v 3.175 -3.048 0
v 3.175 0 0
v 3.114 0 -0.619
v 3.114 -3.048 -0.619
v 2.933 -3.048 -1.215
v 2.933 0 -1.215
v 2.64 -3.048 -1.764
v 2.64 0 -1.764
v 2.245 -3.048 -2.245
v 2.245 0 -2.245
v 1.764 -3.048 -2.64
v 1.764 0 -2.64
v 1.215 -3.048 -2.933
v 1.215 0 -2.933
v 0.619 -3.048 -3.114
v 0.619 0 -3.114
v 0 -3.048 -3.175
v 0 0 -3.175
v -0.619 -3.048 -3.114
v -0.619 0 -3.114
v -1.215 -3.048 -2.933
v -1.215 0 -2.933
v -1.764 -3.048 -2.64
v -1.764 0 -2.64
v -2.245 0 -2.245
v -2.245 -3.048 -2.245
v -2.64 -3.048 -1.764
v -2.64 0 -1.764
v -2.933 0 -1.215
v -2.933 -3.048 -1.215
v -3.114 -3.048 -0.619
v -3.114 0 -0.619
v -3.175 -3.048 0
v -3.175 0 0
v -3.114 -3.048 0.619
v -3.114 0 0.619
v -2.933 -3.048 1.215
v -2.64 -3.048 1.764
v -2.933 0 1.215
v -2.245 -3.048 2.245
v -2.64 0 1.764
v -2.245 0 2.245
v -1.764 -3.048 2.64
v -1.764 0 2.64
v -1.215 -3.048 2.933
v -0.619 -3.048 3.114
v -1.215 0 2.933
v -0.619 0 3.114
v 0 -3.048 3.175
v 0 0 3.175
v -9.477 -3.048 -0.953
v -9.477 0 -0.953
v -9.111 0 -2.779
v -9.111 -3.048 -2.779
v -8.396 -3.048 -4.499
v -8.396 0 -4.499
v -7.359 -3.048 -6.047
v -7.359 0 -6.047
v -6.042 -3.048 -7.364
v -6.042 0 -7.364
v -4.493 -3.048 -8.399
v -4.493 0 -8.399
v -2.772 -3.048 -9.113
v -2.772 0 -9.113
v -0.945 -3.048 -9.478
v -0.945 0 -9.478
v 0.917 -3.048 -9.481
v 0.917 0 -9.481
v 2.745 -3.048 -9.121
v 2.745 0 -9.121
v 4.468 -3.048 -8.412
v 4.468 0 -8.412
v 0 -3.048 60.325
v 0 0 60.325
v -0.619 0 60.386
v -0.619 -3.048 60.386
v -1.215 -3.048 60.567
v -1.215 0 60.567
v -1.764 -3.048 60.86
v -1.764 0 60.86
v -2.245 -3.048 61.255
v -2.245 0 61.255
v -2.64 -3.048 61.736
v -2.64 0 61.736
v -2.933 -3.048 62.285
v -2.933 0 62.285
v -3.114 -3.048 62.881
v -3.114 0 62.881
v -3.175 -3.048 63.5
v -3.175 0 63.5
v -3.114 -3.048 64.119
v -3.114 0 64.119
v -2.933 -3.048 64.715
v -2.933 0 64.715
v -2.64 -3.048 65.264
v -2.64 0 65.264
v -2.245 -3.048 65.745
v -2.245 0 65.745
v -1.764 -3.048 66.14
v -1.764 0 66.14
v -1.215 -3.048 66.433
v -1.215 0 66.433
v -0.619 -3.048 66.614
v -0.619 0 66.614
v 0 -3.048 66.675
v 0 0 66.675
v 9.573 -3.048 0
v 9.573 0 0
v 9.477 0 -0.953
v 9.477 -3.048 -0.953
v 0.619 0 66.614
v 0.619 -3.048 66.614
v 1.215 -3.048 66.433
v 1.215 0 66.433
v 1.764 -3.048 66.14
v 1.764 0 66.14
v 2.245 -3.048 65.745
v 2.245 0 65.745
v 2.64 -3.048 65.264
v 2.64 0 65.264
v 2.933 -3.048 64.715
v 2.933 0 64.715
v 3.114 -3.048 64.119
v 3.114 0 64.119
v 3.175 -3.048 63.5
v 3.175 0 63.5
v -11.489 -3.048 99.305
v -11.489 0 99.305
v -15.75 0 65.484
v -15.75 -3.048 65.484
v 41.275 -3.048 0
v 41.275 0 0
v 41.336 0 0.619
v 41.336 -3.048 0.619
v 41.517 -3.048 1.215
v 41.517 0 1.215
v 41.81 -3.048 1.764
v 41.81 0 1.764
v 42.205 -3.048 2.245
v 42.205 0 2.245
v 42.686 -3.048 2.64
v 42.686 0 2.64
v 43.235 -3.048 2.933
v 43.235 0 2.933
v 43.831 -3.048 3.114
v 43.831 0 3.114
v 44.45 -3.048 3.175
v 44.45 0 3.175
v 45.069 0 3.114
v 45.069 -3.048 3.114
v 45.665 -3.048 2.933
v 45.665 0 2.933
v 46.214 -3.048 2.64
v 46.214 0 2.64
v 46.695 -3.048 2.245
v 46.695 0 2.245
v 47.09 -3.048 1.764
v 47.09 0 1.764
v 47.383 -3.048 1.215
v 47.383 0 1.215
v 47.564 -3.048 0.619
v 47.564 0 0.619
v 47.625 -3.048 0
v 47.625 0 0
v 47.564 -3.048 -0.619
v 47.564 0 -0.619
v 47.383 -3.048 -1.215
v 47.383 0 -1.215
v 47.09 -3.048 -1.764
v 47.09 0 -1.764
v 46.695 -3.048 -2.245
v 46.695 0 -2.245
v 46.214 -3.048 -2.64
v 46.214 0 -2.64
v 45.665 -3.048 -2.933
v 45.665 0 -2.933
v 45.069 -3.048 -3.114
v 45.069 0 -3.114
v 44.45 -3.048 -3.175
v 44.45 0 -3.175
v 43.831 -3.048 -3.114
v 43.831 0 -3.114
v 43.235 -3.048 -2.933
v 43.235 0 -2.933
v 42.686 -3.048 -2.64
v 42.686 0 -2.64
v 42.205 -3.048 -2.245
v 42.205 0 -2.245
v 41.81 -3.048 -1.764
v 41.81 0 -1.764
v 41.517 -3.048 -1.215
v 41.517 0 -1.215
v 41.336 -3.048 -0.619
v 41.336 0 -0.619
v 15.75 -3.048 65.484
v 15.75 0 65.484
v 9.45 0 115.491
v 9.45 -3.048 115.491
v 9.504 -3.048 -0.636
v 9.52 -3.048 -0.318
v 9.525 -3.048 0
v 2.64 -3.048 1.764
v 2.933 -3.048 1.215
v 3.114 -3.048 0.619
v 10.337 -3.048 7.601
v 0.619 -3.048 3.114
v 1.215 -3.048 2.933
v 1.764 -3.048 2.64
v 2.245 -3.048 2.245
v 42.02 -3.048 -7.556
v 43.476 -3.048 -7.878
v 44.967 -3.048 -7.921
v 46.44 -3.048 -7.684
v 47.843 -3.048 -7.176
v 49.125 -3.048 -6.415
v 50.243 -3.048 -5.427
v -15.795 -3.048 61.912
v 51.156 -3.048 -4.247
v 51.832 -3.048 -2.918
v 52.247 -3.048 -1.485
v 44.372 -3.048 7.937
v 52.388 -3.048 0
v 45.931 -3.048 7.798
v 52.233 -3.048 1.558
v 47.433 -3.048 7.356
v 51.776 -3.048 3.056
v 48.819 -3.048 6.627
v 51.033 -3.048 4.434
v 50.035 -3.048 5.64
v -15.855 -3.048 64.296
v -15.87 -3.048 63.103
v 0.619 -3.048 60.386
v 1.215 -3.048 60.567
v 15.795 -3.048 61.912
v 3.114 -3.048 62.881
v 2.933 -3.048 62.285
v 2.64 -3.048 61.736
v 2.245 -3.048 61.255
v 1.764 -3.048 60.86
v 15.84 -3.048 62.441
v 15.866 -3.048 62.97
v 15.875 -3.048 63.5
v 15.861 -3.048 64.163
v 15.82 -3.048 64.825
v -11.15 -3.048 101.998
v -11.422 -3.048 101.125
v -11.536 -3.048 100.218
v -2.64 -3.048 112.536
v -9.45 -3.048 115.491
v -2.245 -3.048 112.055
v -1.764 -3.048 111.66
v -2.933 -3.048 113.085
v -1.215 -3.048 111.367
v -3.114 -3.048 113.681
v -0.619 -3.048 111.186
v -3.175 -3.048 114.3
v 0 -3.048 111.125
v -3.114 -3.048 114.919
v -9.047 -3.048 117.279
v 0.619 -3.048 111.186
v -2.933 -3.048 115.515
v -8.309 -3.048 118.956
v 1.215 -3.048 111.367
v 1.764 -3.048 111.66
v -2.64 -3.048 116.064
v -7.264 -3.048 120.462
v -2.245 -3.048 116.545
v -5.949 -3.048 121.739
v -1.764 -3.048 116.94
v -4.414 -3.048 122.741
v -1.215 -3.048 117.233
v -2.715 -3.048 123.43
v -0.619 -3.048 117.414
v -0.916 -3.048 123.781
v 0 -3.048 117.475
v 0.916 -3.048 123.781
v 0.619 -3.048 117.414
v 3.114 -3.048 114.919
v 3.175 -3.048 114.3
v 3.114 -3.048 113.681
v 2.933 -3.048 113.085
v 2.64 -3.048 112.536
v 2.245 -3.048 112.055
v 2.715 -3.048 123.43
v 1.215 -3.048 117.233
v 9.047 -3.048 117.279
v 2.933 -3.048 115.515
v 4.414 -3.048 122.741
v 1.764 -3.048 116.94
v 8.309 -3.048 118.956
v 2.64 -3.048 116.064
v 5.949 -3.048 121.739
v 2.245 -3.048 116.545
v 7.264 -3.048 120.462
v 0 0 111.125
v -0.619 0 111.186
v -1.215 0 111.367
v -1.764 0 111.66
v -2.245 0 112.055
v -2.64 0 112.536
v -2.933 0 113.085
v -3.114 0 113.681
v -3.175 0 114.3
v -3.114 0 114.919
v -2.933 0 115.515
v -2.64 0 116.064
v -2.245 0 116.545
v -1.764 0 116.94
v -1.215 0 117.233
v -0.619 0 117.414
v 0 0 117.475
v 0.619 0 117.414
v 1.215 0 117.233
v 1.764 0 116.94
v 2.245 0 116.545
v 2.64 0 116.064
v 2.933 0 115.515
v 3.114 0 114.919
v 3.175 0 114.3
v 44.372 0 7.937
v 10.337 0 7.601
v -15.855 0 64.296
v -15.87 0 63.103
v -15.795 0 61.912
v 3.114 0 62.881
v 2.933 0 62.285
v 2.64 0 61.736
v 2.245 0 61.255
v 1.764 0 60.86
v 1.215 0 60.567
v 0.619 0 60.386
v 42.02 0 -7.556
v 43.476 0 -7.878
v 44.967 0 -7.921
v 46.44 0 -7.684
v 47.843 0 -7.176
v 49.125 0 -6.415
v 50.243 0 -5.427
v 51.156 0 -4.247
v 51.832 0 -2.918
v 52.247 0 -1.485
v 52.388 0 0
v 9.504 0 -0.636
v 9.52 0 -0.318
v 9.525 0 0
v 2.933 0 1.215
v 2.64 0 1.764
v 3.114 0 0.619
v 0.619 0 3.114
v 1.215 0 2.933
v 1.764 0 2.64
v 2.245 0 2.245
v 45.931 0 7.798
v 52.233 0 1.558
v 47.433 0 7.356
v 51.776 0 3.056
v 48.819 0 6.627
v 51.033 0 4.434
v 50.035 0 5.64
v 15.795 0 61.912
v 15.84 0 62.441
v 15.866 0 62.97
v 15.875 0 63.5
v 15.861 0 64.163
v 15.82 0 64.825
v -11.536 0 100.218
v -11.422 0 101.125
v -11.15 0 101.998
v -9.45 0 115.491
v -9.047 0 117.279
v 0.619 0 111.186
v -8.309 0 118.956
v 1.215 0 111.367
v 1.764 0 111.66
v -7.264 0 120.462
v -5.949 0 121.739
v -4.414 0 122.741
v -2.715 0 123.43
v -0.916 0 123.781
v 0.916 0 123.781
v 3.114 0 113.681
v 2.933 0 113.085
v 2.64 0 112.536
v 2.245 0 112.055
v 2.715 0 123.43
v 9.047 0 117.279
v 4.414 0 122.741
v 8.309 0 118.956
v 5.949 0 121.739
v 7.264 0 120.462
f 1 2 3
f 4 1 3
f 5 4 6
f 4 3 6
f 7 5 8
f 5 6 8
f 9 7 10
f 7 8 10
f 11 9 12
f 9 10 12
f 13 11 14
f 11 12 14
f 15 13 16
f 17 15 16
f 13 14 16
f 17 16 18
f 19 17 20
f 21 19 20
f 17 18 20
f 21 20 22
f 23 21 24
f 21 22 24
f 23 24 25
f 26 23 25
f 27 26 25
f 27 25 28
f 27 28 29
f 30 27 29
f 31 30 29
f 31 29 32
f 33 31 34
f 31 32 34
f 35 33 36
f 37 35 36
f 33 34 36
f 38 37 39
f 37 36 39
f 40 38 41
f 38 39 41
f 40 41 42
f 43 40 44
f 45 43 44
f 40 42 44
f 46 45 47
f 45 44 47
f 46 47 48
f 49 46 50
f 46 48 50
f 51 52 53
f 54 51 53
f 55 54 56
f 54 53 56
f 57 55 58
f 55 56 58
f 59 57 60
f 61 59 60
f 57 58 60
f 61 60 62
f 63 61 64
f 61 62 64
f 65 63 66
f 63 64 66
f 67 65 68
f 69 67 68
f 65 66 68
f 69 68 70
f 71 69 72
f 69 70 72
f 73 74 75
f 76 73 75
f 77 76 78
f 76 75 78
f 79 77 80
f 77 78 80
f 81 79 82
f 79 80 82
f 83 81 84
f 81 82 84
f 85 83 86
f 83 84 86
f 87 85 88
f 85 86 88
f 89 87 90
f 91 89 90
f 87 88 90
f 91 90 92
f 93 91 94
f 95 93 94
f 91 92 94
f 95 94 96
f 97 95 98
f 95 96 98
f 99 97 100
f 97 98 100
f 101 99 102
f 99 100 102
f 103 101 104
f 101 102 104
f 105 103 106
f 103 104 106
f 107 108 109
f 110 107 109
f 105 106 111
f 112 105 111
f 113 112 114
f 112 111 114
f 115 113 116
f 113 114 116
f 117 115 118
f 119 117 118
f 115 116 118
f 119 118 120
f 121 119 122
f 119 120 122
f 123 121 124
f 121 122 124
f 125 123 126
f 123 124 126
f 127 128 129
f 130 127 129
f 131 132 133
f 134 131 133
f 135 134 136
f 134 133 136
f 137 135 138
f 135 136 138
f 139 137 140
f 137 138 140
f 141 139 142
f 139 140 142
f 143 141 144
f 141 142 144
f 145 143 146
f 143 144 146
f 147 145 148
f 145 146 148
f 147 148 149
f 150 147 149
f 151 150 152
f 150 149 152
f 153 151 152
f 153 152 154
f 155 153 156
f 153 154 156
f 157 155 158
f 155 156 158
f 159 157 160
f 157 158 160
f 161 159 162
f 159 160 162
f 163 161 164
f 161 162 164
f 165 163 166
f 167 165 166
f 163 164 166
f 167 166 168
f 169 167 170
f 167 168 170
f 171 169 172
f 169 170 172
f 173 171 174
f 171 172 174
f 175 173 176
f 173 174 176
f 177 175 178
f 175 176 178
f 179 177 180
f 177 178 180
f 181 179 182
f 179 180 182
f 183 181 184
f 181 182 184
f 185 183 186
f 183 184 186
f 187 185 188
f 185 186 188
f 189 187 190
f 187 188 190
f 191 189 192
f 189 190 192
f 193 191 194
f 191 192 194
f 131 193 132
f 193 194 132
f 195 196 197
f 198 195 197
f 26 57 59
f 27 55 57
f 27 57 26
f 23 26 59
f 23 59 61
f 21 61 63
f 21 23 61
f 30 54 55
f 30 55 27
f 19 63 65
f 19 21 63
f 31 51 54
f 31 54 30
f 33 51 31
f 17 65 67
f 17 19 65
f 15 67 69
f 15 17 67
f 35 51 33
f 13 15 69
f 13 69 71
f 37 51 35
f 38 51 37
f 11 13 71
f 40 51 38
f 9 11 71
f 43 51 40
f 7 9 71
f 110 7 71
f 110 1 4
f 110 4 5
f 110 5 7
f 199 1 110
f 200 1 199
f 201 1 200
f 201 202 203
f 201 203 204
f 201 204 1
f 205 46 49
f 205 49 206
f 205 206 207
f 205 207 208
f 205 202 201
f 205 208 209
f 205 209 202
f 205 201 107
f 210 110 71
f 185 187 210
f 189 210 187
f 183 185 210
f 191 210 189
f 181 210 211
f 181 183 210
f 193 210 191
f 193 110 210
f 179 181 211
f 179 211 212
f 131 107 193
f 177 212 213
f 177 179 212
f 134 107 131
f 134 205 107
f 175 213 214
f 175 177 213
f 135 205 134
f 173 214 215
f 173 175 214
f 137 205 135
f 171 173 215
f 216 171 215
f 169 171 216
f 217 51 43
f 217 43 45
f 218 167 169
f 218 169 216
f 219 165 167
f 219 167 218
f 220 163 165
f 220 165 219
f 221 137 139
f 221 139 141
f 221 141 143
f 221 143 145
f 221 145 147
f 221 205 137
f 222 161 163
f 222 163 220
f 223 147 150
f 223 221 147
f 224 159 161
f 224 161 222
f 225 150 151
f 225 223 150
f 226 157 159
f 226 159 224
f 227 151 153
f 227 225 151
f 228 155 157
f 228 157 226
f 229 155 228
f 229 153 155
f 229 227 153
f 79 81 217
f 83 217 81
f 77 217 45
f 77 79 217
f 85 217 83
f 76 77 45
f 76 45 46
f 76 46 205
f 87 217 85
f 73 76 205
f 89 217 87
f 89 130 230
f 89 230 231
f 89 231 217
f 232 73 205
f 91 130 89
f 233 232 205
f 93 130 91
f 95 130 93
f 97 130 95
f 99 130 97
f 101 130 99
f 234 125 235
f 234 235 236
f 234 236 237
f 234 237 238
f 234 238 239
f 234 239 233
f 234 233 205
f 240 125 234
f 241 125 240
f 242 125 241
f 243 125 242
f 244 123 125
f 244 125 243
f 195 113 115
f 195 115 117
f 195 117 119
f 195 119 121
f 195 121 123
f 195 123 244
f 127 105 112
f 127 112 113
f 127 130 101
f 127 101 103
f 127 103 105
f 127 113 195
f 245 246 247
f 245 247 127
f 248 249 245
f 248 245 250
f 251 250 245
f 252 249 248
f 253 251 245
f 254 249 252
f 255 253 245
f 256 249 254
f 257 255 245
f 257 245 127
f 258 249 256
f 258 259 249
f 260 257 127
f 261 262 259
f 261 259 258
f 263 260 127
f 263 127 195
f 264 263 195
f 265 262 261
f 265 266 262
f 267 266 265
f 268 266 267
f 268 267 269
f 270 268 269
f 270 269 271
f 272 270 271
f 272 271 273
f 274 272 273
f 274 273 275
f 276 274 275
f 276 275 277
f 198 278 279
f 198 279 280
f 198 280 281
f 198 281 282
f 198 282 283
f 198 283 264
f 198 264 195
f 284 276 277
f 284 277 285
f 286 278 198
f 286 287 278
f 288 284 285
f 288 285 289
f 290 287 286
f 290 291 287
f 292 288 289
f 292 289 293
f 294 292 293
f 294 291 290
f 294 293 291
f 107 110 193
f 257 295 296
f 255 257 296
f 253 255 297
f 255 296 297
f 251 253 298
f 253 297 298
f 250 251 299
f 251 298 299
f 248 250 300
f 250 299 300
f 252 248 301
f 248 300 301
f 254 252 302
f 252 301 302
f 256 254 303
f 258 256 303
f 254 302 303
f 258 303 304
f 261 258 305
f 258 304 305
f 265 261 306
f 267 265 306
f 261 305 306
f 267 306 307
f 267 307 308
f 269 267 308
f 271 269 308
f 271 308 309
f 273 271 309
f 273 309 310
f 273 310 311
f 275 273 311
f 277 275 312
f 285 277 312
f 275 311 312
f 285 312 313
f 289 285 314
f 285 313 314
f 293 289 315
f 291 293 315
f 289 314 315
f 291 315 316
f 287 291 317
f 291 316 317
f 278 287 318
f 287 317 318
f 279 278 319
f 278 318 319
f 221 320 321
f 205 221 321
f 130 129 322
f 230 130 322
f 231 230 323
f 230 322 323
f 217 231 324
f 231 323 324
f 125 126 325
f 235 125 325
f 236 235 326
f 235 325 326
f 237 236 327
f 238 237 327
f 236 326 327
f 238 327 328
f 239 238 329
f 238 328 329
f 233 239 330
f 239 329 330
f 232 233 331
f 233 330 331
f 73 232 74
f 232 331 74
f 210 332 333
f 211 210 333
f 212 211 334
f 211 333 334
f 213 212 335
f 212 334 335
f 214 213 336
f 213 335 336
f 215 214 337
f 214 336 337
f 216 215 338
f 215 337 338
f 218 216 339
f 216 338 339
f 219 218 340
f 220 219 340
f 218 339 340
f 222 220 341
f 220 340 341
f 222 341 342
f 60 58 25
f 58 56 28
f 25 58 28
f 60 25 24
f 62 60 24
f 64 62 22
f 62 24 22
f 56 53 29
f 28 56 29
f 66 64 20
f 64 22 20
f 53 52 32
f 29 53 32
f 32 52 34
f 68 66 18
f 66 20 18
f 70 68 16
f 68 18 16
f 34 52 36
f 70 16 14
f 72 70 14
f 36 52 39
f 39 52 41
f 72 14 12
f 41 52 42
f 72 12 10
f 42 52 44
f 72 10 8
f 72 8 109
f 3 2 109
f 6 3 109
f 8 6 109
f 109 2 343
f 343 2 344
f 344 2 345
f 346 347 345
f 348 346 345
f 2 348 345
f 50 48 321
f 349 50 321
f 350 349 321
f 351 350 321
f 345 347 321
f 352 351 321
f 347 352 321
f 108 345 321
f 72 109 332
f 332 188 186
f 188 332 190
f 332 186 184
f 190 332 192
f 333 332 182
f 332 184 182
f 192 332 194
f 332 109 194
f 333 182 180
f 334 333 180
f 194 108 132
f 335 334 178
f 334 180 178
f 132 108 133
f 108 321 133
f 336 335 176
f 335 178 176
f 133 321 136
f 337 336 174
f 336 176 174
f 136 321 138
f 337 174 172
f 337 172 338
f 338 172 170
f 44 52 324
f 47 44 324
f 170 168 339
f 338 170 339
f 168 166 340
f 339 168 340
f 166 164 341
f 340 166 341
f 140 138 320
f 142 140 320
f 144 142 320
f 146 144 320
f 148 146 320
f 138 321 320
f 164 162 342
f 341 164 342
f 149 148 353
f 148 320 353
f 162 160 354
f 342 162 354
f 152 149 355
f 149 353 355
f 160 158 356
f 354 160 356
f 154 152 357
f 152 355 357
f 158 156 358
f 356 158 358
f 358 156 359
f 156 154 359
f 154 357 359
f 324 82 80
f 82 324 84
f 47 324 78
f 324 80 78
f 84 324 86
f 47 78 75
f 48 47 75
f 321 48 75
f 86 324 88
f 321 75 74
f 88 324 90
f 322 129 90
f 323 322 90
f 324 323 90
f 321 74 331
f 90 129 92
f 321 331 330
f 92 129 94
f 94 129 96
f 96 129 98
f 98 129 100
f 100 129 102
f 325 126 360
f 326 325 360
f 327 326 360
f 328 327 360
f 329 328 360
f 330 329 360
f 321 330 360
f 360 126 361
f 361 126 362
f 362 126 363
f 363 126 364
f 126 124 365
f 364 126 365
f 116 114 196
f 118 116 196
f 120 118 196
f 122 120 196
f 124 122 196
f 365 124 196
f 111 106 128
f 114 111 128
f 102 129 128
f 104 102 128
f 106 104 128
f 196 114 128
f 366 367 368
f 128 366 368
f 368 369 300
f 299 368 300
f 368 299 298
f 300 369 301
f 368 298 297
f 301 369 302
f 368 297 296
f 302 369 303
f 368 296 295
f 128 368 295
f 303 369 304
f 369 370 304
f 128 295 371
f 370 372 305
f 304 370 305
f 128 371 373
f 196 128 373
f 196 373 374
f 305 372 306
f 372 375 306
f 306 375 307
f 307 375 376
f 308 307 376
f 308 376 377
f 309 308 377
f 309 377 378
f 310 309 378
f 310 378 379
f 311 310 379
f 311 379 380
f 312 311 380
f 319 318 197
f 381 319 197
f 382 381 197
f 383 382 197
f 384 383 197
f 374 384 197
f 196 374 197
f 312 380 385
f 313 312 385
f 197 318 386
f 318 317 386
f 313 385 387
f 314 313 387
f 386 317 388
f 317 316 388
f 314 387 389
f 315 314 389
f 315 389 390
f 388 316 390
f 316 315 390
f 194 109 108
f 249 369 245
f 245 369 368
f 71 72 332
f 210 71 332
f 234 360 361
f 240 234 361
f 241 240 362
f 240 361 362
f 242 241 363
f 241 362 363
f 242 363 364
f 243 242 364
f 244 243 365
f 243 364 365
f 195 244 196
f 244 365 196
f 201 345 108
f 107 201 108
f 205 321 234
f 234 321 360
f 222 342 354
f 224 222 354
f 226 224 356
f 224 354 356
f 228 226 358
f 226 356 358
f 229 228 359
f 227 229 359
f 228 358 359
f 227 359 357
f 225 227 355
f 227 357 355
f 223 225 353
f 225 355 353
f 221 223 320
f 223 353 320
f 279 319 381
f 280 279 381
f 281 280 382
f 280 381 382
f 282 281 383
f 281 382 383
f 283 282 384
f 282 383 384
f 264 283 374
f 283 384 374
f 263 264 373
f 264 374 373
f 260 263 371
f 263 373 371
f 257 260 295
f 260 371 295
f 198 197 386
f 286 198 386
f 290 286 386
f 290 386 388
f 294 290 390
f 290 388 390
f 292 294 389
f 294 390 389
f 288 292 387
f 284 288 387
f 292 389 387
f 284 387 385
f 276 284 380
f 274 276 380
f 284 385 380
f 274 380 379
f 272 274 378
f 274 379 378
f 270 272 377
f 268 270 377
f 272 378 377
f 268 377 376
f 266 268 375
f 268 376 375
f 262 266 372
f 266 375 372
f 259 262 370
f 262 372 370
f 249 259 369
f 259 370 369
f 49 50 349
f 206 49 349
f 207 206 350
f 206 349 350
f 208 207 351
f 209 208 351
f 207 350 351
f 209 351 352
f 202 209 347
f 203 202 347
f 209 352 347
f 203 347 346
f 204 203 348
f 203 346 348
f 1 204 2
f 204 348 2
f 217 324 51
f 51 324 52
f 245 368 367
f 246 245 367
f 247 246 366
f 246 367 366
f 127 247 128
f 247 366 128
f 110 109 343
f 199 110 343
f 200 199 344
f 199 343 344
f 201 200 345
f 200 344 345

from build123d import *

# Parameters (mm, degrees)
F1_DEPTH = 3.048


with BuildPart() as f1:
    # F0 (on Front) → F1 (new body)
    with BuildSketch(Plane.XZ):
        with BuildLine():
            ThreePointArc((-9.4502929642, 115.490625), (-7.14375, 107.9998046905), (0, 104.775))
            ThreePointArc((0, 104.775), (6.7351920908, 107.5648079092), (9.525, 114.3))
            ThreePointArc((9.525, 114.3), (9.5063048942, 114.896483242), (9.4502929642, 115.490625))
            ThreePointArc((9.4502929642, 115.490625), (0, 123.825), (-9.4502929642, 115.490625))
        make_face()
        with BuildLine():
            ThreePointArc((3.175, 114.3), (2.2450640303, 112.0549359697), (0, 111.125))
            ThreePointArc((0, 111.125), (-2.2450640303, 116.5450640303), (3.175, 114.3))
        make_face(mode=Mode.SUBTRACT)
        with BuildLine():
            ThreePointArc((9.525, 114.3), (6.7351920908, 107.5648079092), (0, 104.775))
            Line((0, 104.775), (0, 79.375))
            ThreePointArc((0, 79.375), (10.5003255158, 75.40625), (15.7504882737, 65.484375))
            Line((15.7504882737, 65.484375), (9.4502929642, 115.490625))
            ThreePointArc((9.4502929642, 115.490625), (9.5063048942, 114.896483242), (9.525, 114.3))
        make_face()
        with BuildLine():
            Line((0, 79.375), (0, 104.775))
            ThreePointArc((0, 104.775), (-7.14375, 107.9998046905), (-9.4502929642, 115.490625))
            Line((-9.4502929642, 115.490625), (-11.1502544755, 101.9975988084))
            ThreePointArc((-11.1502544755, 101.9975988084), (-5.3447623517, 105.1165944415), (-1.1603179203, 100.0252))
            ThreePointArc((-1.1603179203, 100.0252), (-5.9890709954, 94.8480839744), (-11.4894787169, 99.3050898642))
            Line((-11.4894787169, 99.3050898642), (-15.7504882737, 65.484375))
            ThreePointArc((-15.7504882737, 65.484375), (-10.5003255158, 75.40625), (0, 79.375))
        make_face()
        with BuildLine():
            ThreePointArc((15.7504882737, 65.484375), (10.5003255158, 75.40625), (0, 79.375))
            Line((0, 79.375), (0, 66.675))
            ThreePointArc((0, 66.675), (2.2450640303, 65.7450640303), (3.175, 63.5))
            ThreePointArc((3.175, 63.5), (2.2450640303, 61.2549359697), (0, 60.325))
            Line((0, 60.325), (0, 47.625))
            ThreePointArc((0, 47.625), (10.6492737428, 51.7267849017), (15.7954255641, 61.9125))
            ThreePointArc((15.7954255641, 61.9125), (15.8550939106, 62.7052534459), (15.875, 63.5))
            ThreePointArc((15.875, 63.5), (15.8438414904, 64.4941387366), (15.7504882737, 65.484375))
        make_face()
        with BuildLine():
            Line((0, 66.675), (0, 79.375))
            ThreePointArc((0, 79.375), (-10.5003255158, 75.40625), (-15.7504882737, 65.484375))
            ThreePointArc((-15.7504882737, 65.484375), (-15.8737438155, 63.6997054867), (-15.7954255641, 61.9125))
            ThreePointArc((-15.7954255641, 61.9125), (-10.6492737428, 51.7267849017), (0, 47.625))
            Line((0, 47.625), (0, 60.325))
            ThreePointArc((0, 60.325), (-3.175, 63.5), (0, 66.675))
        make_face()
        with BuildLine():
            ThreePointArc((-1.1603179203, 100.0252), (-5.3447623517, 105.1165944415), (-11.1502544755, 101.9975988084))
            Line((-11.1502544755, 101.9975988084), (-11.4894787169, 99.3050898642))
            ThreePointArc((-11.4894787169, 99.3050898642), (-5.9890709954, 94.8480839744), (-1.1603179203, 100.0252))
        make_face()
        with BuildLine():
            Line((-11.4894787169, 99.3050898642), (-11.1502544755, 101.9975988084))
            ThreePointArc((-11.1502544755, 101.9975988084), (-11.4989780624, 100.67391026), (-11.4894787169, 99.3050898642))
        make_face()
        with BuildLine():
            ThreePointArc((0, 47.625), (-10.6492737428, 51.7267849017), (-15.7954255641, 61.9125))
            Line((-15.7954255641, 61.9125), (-9.4772553384, -0.9525))
            ThreePointArc((-9.4772553384, -0.9525), (-7.063929059, 6.3895642457), (0, 9.525))
            Line((0, 9.525), (0, 47.625))
        make_face()
        with BuildLine():
            ThreePointArc((15.7954255641, 61.9125), (10.6492737428, 51.7267849017), (0, 47.625))
            Line((0, 47.625), (0, 9.525))
            ThreePointArc((0, 9.525), (3.0618336501, 9.0194678168), (5.7986582819, 7.5565327452))
            Line((5.7986582819, 7.5565327452), (10.336945567, 7.6013097722))
            Line((10.336945567, 7.6013097722), (15.7954255641, 61.9125))
        make_face()
        with BuildLine():
            ThreePointArc((0, 9.525), (-7.063929059, 6.3895642457), (-9.4772553384, -0.9525))
            ThreePointArc((-9.4772553384, -0.9525), (-4.4927588218, -8.3988536818), (4.4678891991, -8.4121097891))
            ThreePointArc((4.4678891991, -8.4121097891), (7.9074780174, -5.3101239538), (9.4772553384, -0.9525))
            ThreePointArc((9.4772553384, -0.9525), (9.5130563464, -0.4768479324), (9.525, 0))
            Line((9.525, 0), (3.175, 0))
            ThreePointArc((3.175, 0), (-2.2450640303, -2.2450640303), (0, 3.175))
            Line((0, 3.175), (0, 9.525))
        make_face()
        with BuildLine():
            Line((44.3716884408, 7.9371136788), (10.336945567, 7.6013097722))
            Line((10.336945567, 7.6013097722), (9.5729851903, 0))
            Line((9.5729851903, 0), (36.5125, 0))
            ThreePointArc((36.5125, 0), (38.8097205632, 5.5849041285), (44.3716884408, 7.9371136788))
        make_face()
        with BuildLine():
            Line((9.5729851903, 0), (10.336945567, 7.6013097722))
            Line((10.336945567, 7.6013097722), (5.7986582819, 7.5565327452))
            ThreePointArc((5.7986582819, 7.5565327452), (8.5427701928, 4.2126835191), (9.525, 0))
            Line((9.525, 0), (9.5729851903, 0))
        make_face()
        with BuildLine():
            ThreePointArc((9.4772553384, -0.9525), (7.9074780174, -5.3101239538), (4.4678891991, -8.4121097891))
            Line((4.4678891991, -8.4121097891), (42.0198443673, -7.5563383891))
            ThreePointArc((42.0198443673, -7.5563383891), (38.0354358455, -4.6751762488), (36.5125, 0))
            Line((36.5125, 0), (9.5729851903, 0))
            Line((9.5729851903, 0), (9.4772553384, -0.9525))
        make_face()
        with BuildLine():
            ThreePointArc((52.3875, 0), (50.0349041285, 5.6402794368), (44.3716884408, 7.9371136788))
            ThreePointArc((44.3716884408, 7.9371136788), (38.8097205632, 5.5849041285), (36.5125, 0))
            ThreePointArc((36.5125, 0), (38.0354358455, -4.6751762488), (42.0198443673, -7.5563383891))
            ThreePointArc((42.0198443673, -7.5563383891), (49.1251762488, -6.4145641545), (52.3875, 0))
        make_face()
        with BuildLine():
            ThreePointArc((47.625, 0), (44.45, -3.175), (41.275, 0))
            ThreePointArc((41.275, 0), (44.45, 3.175), (47.625, 0))
        make_face(mode=Mode.SUBTRACT)
        with BuildLine():
            ThreePointArc((5.7986582819, 7.5565327452), (3.0618336501, 9.0194678168), (0, 9.525))
            Line((0, 9.525), (0, 3.175))
            ThreePointArc((0, 3.175), (2.2450640303, 2.2450640303), (3.175, 0))
            Line((3.175, 0), (9.525, 0))
            ThreePointArc((9.525, 0), (8.5427701928, 4.2126835191), (5.7986582819, 7.5565327452))
        make_face()
    extrude(amount=F1_DEPTH)


solid = f1.part
